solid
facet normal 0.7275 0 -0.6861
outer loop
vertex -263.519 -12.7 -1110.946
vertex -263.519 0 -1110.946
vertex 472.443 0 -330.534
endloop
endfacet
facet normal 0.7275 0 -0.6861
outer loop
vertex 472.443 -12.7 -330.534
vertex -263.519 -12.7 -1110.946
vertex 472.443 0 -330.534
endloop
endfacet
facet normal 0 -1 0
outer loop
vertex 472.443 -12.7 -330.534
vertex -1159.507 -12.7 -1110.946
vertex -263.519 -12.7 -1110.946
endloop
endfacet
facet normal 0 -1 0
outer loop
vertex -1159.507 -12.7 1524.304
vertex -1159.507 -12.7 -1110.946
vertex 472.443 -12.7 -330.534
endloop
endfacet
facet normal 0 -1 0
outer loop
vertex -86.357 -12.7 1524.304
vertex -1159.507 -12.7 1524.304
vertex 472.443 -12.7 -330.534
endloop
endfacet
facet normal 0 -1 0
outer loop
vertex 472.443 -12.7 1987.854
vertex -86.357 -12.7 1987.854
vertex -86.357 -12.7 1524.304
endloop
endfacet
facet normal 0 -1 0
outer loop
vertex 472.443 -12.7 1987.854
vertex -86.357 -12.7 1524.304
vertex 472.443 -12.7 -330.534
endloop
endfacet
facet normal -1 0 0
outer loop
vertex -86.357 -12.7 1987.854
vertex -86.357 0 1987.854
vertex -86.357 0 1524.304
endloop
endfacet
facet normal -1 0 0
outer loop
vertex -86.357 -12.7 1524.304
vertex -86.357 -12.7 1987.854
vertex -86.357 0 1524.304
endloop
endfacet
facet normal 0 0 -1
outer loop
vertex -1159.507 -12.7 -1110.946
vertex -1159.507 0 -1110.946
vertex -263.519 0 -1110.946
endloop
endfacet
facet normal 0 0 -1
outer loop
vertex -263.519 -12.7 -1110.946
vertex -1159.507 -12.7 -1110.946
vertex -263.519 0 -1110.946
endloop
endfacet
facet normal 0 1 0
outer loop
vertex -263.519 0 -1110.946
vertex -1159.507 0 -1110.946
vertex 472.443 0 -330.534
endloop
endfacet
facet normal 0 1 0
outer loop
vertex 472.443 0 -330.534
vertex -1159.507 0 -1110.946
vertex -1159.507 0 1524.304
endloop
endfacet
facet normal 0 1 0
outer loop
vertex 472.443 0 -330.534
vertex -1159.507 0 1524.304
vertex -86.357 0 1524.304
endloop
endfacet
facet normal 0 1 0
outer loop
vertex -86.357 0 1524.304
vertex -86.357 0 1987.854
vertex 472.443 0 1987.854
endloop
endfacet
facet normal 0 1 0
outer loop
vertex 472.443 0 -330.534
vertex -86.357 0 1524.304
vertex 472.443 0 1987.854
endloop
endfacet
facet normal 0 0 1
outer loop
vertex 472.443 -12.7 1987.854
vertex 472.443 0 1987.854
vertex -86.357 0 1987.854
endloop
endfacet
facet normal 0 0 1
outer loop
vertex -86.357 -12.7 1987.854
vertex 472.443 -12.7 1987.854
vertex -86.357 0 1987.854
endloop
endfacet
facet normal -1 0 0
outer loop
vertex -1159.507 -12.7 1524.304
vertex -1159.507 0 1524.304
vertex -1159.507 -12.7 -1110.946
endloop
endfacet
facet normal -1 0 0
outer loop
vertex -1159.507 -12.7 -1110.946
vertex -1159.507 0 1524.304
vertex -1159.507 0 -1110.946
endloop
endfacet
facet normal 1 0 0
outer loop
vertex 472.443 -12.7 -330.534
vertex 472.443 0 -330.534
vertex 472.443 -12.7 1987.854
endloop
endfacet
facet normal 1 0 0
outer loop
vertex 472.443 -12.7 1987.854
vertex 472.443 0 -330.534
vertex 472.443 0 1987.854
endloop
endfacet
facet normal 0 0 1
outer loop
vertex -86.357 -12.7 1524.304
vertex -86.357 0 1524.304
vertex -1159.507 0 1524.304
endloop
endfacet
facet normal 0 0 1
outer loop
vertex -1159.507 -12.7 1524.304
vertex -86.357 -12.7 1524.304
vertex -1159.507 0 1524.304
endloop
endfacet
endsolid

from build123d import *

# Parameters (mm, degrees)
F0_W     = 381
F0_H     = 780.4117928475
F0_W_2   = 44.45
F0_W_3   = 381.6382071525
F1_DEPTH = 12.7
F0_W_4   = 492.125
F0_H_2   = 867.0322071525
F0_H_3   = 44.45
F0_H_4   = 854.456
F2_DEPTH = 12.7
F0_W_5   = 514.35
F0_H_5   = 641.6072071525
F0_H_6   = 629.031
F0_H_7   = 406.4
F0_H_8   = 419.1
F3_DEPTH = 12.7


with BuildPart() as f1:
    # F0 (on Front) → F1 (new body)
    with BuildSketch(Plane.XZ):
        Polygon((-1159.5071711258, -308.3058698438), (-1159.5071711258, -1110.9458698438), (-1115.0571711258, -1110.9458698438), (-1115.0571711258, -330.5340769963), (-1115.0571711258, -308.3058698438), align=None)
        with Locations((-924.5571711258, -720.73997342)):
            Rectangle(F0_W, F0_H)
        Polygon((-64.1321711258, -308.3058698438), (-1115.0571711258, -308.3058698438), (-1115.0571711258, -330.5340769963), (-734.0571711258, -330.5340769963), (-689.6071711258, -330.5340769963), (-307.9689639733, -330.5340769963), (-263.5189639733, -330.5340769963), (472.4428288742, -330.5340769963), (472.4428288742, -308.3058698438), align=None)
        with Locations((-711.8321711258, -720.73997342)):
            Rectangle(F0_W_2, F0_H)
        with Locations((-285.7439639733, -720.73997342)):
            Rectangle(F0_W_2, F0_H)
        with Locations((-498.7880675496, -720.73997342)):
            Rectangle(F0_W_3, F0_H)
        Polygon((-263.5189639733, -330.5340769963), (-263.5189639733, -1110.9458698438), (472.4428288742, -330.5340769963), align=None)
    extrude(amount=F1_DEPTH)

    # F0 (on Front) → F2 (join)
    with BuildSketch(Plane.XZ):
        with Locations((-868.9946711258, 147.43202658)):
            Rectangle(F0_W_4, F0_H_2)
        with Locations((-332.4196711258, 147.43202658)):
            Rectangle(F0_W_4, F0_H_2)
        Polygon((-578.4821711258, 1479.8541301562), (-622.9321711258, 1479.8541301562), (-622.9321711258, 625.3981301562), (-622.9321711258, 580.9481301562), (-622.9321711258, -286.0840769963), (-578.4821711258, -286.0840769963), (-578.4821711258, 580.9481301562), (-578.4821711258, 625.3981301562), align=None)
        Polygon((-1115.0571711258, -286.0840769963), (-1115.0571711258, -308.3058698438), (-64.1321711258, -308.3058698438), (-64.1321711258, -286.0840769963), (-86.3571711258, -286.0840769963), (-578.4821711258, -286.0840769963), (-622.9321711258, -286.0840769963), align=None)
        Polygon((-64.1321711258, 1524.3041301562), (-86.3571711258, 1524.3041301562), (-86.3571711258, 1479.8541301562), (-86.3571711258, 625.3981301562), (-86.3571711258, 580.9481301562), (-86.3571711258, -286.0840769963), (-64.1321711258, -286.0840769963), align=None)
        with Locations((-332.4196711258, 603.1731301562)):
            Rectangle(F0_W_4, F0_H_3)
        with Locations((-868.9946711258, 603.1731301562)):
            Rectangle(F0_W_4, F0_H_3)
        with Locations((-868.9946711258, 1052.6261301562)):
            Rectangle(F0_W_4, F0_H_4)
        with Locations((-332.4196711258, 1052.6261301562)):
            Rectangle(F0_W_4, F0_H_4)
        Polygon((-1159.5071711258, 1524.3041301562), (-1159.5071711258, 1479.8541301562), (-1115.0571711258, 1479.8541301562), (-622.9321711258, 1479.8541301562), (-578.4821711258, 1479.8541301562), (-86.3571711258, 1479.8541301562), (-86.3571711258, 1524.3041301562), align=None)
        Polygon((-1159.5071711258, 1479.8541301562), (-1159.5071711258, -308.3058698438), (-1115.0571711258, -308.3058698438), (-1115.0571711258, -286.0840769963), (-1115.0571711258, 580.9481301562), (-1115.0571711258, 625.3981301562), (-1115.0571711258, 1479.8541301562), align=None)
    extrude(amount=F2_DEPTH)

    # F0 (on Front) → F3 (join)
    with BuildSketch(Plane.XZ):
        with Locations((215.2678288742, 34.71952658)):
            Rectangle(F0_W_5, F0_H_5)
        with Locations((215.2678288742, 377.7481301562)):
            Rectangle(F0_W_5, F0_H_3)
        with Locations((215.2678288742, 714.4886301562)):
            Rectangle(F0_W_5, F0_H_6)
        with Locations((215.2678288742, 1276.6541301562)):
            Rectangle(F0_W_5, F0_H_7)
        with Locations((215.2678288742, 1051.2291301562)):
            Rectangle(F0_W_5, F0_H_3)
        Polygon((-86.3571711258, 1987.8541301562), (-86.3571711258, 1524.3041301562), (-64.1321711258, 1524.3041301562), (-64.1321711258, -286.0840769963), (-41.9071711258, -286.0840769963), (-41.9071711258, 355.5231301562), (-41.9071711258, 399.9731301562), (-41.9071711258, 1029.0041301562), (-41.9071711258, 1073.4541301562), (-41.9071711258, 1479.8541301562), (-41.9071711258, 1524.3041301562), (-41.9071711258, 1943.4041301562), (-41.9071711258, 1987.8541301562), (-64.1321711258, 1987.8541301562), align=None)
        Polygon((-64.1321711258, -286.0840769963), (-64.1321711258, -308.3058698438), (472.4428288742, -308.3058698438), (472.4428288742, -286.0840769963), (-41.9071711258, -286.0840769963), align=None)
        with Locations((215.2678288742, 1502.0791301562)):
            Rectangle(F0_W_5, F0_H_3)
        with Locations((215.2678288742, 1965.6291301562)):
            Rectangle(F0_W_5, F0_H_3)
        with Locations((215.2678288742, 1733.8541301562)):
            Rectangle(F0_W_5, F0_H_8)
    extrude(amount=F3_DEPTH)


solid = f1.part
